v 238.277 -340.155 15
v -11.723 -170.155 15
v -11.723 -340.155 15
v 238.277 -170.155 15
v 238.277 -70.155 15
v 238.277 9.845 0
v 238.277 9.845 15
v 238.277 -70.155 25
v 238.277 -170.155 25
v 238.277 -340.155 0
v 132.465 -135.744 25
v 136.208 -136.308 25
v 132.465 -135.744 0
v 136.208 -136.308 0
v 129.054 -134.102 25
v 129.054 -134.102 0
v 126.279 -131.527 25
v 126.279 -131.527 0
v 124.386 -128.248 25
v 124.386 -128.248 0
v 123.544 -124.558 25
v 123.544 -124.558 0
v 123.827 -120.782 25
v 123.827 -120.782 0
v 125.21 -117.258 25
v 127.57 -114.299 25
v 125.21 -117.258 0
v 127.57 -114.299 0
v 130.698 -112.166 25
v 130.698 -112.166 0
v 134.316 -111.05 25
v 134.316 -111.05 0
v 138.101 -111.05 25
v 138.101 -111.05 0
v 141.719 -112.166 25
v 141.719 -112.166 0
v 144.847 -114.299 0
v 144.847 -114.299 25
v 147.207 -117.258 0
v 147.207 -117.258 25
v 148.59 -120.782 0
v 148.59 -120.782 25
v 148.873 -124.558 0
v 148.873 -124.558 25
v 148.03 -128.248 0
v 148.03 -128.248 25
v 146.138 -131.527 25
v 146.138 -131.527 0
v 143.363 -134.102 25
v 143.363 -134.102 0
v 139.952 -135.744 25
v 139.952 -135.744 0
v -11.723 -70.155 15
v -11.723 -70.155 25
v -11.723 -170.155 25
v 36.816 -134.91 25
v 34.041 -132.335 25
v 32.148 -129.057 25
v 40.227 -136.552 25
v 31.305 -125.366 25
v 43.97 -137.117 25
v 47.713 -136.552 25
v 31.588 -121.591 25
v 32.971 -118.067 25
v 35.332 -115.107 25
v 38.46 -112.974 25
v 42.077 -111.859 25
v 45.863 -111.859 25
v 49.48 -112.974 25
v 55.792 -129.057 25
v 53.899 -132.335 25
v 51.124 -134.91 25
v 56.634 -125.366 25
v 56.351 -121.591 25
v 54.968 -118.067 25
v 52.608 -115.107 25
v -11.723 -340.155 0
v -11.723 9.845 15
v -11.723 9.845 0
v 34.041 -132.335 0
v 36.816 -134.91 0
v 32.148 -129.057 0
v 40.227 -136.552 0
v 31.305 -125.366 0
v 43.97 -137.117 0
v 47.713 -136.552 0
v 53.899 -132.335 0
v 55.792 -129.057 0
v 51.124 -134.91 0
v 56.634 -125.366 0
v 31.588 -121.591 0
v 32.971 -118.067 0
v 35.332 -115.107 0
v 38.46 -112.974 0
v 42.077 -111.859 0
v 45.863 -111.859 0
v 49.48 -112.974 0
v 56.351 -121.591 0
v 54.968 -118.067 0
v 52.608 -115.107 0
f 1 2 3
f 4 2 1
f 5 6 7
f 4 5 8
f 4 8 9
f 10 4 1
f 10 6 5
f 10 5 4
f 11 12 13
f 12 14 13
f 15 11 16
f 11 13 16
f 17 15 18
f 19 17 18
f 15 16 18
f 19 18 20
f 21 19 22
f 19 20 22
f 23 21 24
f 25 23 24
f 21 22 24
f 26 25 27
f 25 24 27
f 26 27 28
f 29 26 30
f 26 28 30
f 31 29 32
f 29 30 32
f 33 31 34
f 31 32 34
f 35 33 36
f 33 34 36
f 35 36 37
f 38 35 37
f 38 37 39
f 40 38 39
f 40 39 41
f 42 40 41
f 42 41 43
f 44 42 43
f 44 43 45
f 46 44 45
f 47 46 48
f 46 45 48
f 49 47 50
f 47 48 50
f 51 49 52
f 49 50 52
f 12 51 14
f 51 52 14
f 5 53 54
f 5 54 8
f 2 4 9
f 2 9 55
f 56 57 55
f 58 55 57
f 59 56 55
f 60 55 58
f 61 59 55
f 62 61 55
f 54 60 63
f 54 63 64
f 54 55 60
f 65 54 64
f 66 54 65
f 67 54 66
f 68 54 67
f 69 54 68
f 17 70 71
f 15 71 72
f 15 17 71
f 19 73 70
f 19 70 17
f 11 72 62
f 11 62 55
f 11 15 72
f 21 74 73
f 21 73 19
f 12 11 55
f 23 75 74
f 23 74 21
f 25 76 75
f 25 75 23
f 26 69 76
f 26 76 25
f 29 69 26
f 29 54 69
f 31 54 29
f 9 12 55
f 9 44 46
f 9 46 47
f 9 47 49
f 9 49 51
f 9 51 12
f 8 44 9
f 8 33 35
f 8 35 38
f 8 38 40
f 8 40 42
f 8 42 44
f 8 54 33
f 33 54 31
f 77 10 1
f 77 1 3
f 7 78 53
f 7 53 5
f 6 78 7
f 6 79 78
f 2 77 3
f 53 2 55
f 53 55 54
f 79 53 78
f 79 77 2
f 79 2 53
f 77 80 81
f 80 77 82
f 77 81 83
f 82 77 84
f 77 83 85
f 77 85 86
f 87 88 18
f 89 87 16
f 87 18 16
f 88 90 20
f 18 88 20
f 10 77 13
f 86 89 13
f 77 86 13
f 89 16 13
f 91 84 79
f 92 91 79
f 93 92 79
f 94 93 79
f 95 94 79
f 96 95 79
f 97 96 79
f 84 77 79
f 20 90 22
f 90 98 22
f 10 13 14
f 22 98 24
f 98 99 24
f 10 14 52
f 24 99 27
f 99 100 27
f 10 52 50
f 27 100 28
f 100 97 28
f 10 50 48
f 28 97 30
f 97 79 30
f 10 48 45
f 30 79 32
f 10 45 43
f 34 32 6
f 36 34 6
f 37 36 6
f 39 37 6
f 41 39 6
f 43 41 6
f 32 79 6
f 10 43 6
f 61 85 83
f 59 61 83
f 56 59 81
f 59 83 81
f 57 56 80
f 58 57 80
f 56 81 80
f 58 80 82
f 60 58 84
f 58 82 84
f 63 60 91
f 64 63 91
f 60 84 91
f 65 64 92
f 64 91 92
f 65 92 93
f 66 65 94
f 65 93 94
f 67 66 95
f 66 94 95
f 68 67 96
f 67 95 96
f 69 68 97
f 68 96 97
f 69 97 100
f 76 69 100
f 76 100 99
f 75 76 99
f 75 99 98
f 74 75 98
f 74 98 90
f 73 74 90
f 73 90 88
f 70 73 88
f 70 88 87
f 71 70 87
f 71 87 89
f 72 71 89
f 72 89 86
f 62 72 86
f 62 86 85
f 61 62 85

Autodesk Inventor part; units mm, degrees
ref_plane "YZ Plane" through (0, 0, 0) normal (1, 0, 0) x (0, 1, 0)
ref_plane "XZ Plane" through (0, 0, 0) normal (0, 1, 0) x (-1, 0, 0)
ref_plane "XY Plane" through (0, 0, 0) normal (0, 0, 1) x (1, 0, 0)
sketch "Sketch1" plane through (0, 0, 0) normal (0, 0, 1) x (1, 0, 0)
  line L0 (-11.7228, 9.8454) -> (238.2772, 9.8454)
  line L1 (238.2772, 9.8454) -> (238.2772, -340.1546)
  line L2 (238.2772, -340.1546) -> (-11.7228, -340.1546)
  line L3 (-11.7228, -340.1546) -> (-11.7228, 9.8454)
  point P0 (0, 0)
  dimension "d0" = 250
  dimension "d1" = 350
extrude "Extrusion1" add sketch "Sketch1" along normal blind 15
sketch "Sketch2" plane through (0, 0, 15) normal (0, 0, 1) x (1, 0, 0)
  line L0 (-11.7228, 9.8454) -> (-11.7228, -340.1546) projected
  line L1 (238.2772, -340.1546) -> (238.2772, 9.8454) projected
  line L2 (-11.7228, -70.1546) -> (238.2772, -70.1546)
  line L3 (238.2772, -70.1546) -> (238.2772, -170.1546)
  line L4 (238.2772, -170.1546) -> (-11.7228, -170.1546)
  line L5 (-11.7228, -170.1546) -> (-11.7228, -70.1546)
  line L6 (238.2772, 9.8454) -> (-11.7228, 9.8454) projected
  line L7 (-11.7228, -340.1546) -> (238.2772, -340.1546) projected
  point P0 (0, 0)
  point P1 (-11.7228, -170.1546)
  dimension "d4" = 80
  dimension "d5" = 170
extrude "Extrusion2" add sketch "Sketch2" along normal blind 10 contours L2 L1 L4 L0
sketch "Sketch3" plane through (0, 0, 25) normal (0, 0, 1) x (1, 0, 0)
  point P0 (0, 0)
  point P1 (43.9699, -124.4167)
  point P2 (136.2084, -123.6085)
hole "Hole1" at (43.9699, -124.4167, 25) at (136.2084, -123.6085, 25) direction (0, 0, -1) diameter 25.4 end through all
properties part number "base"
